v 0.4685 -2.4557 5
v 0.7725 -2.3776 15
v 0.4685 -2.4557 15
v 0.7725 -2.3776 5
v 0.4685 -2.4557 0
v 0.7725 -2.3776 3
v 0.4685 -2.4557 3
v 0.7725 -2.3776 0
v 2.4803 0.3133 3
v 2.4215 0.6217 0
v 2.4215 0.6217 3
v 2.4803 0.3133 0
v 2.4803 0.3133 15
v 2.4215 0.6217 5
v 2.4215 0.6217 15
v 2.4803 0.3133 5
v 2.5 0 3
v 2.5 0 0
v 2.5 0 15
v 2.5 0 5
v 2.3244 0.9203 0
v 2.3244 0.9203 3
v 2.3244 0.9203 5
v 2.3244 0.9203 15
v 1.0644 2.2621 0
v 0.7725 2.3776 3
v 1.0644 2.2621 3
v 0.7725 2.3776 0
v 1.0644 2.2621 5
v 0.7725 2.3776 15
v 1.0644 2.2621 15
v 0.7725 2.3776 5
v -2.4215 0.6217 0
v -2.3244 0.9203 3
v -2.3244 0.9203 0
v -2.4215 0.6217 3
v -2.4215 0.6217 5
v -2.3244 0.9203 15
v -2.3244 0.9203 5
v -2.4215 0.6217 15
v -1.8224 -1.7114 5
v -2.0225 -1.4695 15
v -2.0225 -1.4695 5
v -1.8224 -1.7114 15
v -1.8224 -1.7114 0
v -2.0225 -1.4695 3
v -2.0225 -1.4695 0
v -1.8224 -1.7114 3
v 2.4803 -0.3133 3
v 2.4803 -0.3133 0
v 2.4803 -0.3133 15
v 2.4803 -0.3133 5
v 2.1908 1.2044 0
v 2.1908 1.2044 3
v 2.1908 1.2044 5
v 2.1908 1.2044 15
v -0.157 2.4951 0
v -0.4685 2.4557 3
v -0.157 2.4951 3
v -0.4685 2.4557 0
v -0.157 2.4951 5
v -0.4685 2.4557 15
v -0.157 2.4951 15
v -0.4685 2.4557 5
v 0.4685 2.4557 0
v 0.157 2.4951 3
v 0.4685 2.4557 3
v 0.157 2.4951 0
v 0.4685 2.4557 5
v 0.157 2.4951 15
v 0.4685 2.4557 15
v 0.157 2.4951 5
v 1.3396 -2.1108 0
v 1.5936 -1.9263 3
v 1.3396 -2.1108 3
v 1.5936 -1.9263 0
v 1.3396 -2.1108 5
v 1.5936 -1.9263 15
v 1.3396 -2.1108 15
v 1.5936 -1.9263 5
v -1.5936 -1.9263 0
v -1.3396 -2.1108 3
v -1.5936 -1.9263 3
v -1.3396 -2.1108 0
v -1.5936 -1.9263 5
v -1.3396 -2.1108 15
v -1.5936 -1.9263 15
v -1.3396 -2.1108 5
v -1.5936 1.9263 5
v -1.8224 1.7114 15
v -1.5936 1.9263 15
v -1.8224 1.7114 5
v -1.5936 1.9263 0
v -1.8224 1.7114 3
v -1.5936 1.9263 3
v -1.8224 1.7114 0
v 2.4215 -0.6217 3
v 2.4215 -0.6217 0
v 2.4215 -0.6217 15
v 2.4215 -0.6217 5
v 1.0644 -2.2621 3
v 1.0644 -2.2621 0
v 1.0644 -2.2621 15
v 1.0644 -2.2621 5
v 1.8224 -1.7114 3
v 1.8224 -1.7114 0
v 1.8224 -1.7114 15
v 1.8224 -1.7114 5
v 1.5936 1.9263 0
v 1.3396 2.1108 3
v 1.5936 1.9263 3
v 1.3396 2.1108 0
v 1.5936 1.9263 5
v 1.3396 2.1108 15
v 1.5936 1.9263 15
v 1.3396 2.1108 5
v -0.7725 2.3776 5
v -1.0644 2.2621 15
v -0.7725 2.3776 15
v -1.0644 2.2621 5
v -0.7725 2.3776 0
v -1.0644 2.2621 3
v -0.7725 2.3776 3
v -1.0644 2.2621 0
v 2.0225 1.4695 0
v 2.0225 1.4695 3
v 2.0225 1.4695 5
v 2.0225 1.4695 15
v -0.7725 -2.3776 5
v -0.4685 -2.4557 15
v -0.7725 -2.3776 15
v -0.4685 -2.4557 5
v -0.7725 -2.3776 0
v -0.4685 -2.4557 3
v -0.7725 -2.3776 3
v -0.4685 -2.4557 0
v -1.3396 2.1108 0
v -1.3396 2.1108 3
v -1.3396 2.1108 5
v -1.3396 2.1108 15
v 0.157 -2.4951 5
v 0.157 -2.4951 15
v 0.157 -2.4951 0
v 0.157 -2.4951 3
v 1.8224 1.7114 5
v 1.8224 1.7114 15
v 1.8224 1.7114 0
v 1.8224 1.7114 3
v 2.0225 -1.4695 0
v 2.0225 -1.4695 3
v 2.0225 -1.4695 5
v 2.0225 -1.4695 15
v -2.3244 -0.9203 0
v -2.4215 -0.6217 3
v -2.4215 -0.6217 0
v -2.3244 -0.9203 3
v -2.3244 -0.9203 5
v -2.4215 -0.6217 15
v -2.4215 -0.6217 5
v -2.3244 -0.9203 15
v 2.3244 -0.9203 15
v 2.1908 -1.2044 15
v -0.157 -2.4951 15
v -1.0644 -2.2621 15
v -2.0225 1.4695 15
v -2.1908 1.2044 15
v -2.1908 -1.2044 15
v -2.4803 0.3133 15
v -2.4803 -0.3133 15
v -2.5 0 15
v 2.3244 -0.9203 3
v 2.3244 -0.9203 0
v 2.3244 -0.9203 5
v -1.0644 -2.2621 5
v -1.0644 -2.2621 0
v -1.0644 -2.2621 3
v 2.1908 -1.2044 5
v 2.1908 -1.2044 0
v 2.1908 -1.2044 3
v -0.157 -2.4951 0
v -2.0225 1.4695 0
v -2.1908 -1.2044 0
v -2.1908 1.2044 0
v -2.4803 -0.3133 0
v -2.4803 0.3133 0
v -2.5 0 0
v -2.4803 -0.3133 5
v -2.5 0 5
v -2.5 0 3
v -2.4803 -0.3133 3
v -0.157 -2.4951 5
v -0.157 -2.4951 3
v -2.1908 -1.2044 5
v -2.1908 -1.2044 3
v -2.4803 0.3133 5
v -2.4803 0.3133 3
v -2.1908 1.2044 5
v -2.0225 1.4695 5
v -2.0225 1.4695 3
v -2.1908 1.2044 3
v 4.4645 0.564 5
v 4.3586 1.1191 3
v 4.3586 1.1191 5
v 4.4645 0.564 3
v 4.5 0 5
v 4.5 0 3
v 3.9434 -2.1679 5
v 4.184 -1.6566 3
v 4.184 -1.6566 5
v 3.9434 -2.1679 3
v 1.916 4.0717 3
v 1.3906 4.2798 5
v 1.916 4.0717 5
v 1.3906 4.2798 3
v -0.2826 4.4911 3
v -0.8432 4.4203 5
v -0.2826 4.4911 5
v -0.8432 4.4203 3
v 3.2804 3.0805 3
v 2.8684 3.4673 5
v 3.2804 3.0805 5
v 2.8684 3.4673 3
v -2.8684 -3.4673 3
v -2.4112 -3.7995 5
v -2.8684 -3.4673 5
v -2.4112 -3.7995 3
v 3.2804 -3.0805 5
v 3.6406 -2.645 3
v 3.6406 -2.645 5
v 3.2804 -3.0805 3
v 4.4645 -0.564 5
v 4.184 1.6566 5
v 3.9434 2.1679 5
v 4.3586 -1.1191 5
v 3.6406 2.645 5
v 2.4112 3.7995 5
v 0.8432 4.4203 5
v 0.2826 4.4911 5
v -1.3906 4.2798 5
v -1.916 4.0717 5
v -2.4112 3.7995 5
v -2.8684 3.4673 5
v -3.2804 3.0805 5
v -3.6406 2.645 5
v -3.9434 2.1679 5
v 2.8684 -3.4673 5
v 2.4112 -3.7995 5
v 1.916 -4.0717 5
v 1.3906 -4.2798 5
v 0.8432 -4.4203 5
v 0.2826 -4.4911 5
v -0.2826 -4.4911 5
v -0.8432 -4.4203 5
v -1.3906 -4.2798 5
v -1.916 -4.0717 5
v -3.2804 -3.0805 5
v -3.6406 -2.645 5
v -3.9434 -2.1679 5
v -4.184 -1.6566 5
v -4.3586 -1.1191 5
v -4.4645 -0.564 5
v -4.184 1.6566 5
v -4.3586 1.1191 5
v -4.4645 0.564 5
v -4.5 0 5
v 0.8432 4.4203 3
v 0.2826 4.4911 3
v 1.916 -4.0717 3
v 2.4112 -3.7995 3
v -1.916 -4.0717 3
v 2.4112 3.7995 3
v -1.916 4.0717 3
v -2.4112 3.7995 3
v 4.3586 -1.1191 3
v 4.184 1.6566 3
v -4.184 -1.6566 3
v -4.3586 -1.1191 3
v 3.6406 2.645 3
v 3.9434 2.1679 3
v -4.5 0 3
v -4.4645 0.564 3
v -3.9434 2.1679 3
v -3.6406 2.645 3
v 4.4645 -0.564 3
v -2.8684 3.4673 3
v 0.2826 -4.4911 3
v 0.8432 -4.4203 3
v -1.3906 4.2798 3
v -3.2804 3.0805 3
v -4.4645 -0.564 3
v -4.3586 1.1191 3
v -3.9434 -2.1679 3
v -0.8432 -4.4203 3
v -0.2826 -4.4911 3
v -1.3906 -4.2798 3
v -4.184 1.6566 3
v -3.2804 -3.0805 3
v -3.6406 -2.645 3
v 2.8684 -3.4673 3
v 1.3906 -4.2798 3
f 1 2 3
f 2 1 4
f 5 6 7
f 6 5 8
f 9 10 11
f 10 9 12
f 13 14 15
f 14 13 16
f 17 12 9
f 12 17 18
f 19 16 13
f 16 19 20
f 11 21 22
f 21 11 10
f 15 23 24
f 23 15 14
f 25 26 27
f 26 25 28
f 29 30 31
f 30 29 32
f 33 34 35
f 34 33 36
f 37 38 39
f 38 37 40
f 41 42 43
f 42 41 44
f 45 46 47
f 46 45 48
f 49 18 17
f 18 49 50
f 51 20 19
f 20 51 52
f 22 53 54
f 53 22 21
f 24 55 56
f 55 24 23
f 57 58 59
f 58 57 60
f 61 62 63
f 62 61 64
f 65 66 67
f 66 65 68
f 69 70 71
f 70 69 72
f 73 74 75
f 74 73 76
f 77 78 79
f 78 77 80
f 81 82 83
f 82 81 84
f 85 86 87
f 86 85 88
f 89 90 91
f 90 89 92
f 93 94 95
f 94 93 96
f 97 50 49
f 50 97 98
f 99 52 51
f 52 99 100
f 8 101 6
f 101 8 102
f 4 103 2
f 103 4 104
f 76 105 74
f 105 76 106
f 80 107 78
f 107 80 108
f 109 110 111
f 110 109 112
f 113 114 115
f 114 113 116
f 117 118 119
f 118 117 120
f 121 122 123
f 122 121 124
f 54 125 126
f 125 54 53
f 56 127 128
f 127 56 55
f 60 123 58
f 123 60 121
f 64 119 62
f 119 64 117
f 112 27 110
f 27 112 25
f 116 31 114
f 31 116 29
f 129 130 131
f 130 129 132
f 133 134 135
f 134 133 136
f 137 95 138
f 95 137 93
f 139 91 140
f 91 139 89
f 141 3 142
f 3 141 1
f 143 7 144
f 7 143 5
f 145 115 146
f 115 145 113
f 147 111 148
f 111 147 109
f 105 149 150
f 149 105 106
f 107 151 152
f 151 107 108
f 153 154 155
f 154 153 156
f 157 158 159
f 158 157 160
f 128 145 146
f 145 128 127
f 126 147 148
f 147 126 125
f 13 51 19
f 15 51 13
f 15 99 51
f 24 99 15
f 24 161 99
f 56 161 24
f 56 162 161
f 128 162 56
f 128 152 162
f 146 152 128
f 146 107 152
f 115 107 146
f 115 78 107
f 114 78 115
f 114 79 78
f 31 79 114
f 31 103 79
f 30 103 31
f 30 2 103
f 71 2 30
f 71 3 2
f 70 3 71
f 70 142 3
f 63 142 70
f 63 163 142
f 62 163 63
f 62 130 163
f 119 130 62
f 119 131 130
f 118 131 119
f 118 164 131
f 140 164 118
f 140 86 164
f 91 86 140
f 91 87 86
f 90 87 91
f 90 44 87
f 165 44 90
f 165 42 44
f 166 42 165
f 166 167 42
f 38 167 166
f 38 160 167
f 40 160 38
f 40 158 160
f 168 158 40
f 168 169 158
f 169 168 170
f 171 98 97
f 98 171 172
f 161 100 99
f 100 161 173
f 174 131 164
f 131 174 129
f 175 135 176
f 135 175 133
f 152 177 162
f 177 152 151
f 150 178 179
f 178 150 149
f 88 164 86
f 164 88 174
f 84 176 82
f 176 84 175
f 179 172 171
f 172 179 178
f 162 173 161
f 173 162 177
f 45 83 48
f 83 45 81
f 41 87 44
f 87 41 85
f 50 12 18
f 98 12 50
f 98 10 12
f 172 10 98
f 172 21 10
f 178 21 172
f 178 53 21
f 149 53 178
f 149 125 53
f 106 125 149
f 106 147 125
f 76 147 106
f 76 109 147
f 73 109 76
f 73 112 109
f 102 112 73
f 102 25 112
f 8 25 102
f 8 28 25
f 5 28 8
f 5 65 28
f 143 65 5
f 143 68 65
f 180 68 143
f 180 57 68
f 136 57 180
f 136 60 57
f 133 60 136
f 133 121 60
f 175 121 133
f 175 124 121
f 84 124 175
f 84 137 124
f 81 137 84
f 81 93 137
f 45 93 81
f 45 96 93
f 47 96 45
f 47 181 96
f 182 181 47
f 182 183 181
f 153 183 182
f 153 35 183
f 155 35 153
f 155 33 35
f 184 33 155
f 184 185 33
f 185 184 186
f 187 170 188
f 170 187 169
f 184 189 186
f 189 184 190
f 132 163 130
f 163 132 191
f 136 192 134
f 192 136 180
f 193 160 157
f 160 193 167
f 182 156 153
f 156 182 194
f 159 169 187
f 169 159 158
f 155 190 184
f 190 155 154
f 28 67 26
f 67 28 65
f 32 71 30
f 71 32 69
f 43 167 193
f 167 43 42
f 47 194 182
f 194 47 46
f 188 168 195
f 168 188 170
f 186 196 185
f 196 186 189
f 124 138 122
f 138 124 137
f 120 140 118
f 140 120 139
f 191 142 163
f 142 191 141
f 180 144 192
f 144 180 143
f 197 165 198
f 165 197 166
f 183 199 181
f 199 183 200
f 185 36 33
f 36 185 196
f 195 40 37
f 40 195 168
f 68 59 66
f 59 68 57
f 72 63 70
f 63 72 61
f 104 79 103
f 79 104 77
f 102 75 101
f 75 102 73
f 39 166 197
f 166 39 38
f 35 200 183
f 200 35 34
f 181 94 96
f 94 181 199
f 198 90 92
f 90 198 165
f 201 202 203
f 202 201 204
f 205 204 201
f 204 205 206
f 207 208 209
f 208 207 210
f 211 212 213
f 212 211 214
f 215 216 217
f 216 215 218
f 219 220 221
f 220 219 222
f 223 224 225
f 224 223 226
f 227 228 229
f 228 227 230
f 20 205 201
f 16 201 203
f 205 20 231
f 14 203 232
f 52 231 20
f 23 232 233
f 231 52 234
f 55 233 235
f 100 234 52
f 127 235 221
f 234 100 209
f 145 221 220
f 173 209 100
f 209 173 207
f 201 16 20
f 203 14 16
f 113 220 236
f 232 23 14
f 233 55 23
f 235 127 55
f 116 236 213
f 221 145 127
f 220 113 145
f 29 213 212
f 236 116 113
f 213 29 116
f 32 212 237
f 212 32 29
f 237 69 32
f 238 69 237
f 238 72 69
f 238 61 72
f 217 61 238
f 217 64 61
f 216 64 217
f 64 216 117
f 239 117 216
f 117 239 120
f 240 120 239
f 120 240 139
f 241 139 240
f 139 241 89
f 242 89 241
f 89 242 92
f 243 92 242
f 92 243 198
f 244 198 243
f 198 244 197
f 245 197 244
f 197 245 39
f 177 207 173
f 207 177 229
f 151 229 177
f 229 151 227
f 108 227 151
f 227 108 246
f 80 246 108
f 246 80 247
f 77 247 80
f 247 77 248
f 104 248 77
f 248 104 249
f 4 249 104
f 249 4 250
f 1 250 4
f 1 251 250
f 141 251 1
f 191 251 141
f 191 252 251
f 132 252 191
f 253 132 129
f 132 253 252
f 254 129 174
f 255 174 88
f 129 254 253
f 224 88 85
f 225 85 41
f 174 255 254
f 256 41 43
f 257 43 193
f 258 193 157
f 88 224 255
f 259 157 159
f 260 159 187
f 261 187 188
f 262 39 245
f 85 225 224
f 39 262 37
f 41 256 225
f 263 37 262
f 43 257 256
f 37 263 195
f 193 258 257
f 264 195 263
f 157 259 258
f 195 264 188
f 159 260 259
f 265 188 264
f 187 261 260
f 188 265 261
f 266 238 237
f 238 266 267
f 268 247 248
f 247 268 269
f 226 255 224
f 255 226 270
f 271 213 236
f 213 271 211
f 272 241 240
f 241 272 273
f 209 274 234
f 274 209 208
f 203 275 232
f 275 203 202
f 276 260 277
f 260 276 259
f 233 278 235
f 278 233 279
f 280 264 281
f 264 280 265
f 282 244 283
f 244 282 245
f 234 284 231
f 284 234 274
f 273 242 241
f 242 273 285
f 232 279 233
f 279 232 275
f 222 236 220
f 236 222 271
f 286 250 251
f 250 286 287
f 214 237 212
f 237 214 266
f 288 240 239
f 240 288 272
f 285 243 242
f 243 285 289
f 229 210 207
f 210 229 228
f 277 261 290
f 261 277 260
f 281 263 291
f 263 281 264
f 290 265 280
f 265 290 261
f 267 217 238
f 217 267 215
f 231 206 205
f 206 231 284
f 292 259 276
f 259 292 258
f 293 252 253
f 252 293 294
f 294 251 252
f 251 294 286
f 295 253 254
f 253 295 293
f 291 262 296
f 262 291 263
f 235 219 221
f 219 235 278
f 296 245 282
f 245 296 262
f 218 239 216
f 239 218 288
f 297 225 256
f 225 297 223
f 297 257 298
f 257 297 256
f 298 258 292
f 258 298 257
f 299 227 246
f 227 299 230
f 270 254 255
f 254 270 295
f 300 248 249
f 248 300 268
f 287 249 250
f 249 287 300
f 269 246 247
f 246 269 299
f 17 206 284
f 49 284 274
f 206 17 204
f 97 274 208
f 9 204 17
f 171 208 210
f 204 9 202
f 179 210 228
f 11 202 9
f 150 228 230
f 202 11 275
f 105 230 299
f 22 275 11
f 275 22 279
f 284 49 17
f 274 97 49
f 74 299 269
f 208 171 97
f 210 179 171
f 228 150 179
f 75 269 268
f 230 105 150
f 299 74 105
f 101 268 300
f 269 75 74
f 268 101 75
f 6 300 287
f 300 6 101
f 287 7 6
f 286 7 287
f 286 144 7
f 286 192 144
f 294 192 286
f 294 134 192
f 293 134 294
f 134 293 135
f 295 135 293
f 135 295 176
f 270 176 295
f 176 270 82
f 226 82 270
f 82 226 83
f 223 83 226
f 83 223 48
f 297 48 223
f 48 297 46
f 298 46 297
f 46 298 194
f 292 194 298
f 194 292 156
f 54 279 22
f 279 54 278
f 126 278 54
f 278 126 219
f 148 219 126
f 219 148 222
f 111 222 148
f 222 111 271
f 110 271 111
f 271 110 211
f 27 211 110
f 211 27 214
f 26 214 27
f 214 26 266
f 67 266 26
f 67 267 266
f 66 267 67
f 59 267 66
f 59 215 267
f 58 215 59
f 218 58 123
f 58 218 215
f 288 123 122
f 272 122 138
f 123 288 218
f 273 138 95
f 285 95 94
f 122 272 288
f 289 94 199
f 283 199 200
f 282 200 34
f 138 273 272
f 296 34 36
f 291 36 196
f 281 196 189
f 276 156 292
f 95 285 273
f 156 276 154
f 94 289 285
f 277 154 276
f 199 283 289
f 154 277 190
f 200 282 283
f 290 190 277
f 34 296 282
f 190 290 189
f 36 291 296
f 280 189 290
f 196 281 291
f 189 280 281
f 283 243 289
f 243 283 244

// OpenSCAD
$fn=50;
long_tot=15;
diam=5;
ep_bord=2;
h_bord=2;
pos_mep=3;

cylinder(h=long_tot,r=diam/2);
translate([0,0,pos_mep]) cylinder(h=h_bord,r=diam/2+ep_bord);
//translate([0,0,pos_mep+3])cube([50,50,1],center=true);
